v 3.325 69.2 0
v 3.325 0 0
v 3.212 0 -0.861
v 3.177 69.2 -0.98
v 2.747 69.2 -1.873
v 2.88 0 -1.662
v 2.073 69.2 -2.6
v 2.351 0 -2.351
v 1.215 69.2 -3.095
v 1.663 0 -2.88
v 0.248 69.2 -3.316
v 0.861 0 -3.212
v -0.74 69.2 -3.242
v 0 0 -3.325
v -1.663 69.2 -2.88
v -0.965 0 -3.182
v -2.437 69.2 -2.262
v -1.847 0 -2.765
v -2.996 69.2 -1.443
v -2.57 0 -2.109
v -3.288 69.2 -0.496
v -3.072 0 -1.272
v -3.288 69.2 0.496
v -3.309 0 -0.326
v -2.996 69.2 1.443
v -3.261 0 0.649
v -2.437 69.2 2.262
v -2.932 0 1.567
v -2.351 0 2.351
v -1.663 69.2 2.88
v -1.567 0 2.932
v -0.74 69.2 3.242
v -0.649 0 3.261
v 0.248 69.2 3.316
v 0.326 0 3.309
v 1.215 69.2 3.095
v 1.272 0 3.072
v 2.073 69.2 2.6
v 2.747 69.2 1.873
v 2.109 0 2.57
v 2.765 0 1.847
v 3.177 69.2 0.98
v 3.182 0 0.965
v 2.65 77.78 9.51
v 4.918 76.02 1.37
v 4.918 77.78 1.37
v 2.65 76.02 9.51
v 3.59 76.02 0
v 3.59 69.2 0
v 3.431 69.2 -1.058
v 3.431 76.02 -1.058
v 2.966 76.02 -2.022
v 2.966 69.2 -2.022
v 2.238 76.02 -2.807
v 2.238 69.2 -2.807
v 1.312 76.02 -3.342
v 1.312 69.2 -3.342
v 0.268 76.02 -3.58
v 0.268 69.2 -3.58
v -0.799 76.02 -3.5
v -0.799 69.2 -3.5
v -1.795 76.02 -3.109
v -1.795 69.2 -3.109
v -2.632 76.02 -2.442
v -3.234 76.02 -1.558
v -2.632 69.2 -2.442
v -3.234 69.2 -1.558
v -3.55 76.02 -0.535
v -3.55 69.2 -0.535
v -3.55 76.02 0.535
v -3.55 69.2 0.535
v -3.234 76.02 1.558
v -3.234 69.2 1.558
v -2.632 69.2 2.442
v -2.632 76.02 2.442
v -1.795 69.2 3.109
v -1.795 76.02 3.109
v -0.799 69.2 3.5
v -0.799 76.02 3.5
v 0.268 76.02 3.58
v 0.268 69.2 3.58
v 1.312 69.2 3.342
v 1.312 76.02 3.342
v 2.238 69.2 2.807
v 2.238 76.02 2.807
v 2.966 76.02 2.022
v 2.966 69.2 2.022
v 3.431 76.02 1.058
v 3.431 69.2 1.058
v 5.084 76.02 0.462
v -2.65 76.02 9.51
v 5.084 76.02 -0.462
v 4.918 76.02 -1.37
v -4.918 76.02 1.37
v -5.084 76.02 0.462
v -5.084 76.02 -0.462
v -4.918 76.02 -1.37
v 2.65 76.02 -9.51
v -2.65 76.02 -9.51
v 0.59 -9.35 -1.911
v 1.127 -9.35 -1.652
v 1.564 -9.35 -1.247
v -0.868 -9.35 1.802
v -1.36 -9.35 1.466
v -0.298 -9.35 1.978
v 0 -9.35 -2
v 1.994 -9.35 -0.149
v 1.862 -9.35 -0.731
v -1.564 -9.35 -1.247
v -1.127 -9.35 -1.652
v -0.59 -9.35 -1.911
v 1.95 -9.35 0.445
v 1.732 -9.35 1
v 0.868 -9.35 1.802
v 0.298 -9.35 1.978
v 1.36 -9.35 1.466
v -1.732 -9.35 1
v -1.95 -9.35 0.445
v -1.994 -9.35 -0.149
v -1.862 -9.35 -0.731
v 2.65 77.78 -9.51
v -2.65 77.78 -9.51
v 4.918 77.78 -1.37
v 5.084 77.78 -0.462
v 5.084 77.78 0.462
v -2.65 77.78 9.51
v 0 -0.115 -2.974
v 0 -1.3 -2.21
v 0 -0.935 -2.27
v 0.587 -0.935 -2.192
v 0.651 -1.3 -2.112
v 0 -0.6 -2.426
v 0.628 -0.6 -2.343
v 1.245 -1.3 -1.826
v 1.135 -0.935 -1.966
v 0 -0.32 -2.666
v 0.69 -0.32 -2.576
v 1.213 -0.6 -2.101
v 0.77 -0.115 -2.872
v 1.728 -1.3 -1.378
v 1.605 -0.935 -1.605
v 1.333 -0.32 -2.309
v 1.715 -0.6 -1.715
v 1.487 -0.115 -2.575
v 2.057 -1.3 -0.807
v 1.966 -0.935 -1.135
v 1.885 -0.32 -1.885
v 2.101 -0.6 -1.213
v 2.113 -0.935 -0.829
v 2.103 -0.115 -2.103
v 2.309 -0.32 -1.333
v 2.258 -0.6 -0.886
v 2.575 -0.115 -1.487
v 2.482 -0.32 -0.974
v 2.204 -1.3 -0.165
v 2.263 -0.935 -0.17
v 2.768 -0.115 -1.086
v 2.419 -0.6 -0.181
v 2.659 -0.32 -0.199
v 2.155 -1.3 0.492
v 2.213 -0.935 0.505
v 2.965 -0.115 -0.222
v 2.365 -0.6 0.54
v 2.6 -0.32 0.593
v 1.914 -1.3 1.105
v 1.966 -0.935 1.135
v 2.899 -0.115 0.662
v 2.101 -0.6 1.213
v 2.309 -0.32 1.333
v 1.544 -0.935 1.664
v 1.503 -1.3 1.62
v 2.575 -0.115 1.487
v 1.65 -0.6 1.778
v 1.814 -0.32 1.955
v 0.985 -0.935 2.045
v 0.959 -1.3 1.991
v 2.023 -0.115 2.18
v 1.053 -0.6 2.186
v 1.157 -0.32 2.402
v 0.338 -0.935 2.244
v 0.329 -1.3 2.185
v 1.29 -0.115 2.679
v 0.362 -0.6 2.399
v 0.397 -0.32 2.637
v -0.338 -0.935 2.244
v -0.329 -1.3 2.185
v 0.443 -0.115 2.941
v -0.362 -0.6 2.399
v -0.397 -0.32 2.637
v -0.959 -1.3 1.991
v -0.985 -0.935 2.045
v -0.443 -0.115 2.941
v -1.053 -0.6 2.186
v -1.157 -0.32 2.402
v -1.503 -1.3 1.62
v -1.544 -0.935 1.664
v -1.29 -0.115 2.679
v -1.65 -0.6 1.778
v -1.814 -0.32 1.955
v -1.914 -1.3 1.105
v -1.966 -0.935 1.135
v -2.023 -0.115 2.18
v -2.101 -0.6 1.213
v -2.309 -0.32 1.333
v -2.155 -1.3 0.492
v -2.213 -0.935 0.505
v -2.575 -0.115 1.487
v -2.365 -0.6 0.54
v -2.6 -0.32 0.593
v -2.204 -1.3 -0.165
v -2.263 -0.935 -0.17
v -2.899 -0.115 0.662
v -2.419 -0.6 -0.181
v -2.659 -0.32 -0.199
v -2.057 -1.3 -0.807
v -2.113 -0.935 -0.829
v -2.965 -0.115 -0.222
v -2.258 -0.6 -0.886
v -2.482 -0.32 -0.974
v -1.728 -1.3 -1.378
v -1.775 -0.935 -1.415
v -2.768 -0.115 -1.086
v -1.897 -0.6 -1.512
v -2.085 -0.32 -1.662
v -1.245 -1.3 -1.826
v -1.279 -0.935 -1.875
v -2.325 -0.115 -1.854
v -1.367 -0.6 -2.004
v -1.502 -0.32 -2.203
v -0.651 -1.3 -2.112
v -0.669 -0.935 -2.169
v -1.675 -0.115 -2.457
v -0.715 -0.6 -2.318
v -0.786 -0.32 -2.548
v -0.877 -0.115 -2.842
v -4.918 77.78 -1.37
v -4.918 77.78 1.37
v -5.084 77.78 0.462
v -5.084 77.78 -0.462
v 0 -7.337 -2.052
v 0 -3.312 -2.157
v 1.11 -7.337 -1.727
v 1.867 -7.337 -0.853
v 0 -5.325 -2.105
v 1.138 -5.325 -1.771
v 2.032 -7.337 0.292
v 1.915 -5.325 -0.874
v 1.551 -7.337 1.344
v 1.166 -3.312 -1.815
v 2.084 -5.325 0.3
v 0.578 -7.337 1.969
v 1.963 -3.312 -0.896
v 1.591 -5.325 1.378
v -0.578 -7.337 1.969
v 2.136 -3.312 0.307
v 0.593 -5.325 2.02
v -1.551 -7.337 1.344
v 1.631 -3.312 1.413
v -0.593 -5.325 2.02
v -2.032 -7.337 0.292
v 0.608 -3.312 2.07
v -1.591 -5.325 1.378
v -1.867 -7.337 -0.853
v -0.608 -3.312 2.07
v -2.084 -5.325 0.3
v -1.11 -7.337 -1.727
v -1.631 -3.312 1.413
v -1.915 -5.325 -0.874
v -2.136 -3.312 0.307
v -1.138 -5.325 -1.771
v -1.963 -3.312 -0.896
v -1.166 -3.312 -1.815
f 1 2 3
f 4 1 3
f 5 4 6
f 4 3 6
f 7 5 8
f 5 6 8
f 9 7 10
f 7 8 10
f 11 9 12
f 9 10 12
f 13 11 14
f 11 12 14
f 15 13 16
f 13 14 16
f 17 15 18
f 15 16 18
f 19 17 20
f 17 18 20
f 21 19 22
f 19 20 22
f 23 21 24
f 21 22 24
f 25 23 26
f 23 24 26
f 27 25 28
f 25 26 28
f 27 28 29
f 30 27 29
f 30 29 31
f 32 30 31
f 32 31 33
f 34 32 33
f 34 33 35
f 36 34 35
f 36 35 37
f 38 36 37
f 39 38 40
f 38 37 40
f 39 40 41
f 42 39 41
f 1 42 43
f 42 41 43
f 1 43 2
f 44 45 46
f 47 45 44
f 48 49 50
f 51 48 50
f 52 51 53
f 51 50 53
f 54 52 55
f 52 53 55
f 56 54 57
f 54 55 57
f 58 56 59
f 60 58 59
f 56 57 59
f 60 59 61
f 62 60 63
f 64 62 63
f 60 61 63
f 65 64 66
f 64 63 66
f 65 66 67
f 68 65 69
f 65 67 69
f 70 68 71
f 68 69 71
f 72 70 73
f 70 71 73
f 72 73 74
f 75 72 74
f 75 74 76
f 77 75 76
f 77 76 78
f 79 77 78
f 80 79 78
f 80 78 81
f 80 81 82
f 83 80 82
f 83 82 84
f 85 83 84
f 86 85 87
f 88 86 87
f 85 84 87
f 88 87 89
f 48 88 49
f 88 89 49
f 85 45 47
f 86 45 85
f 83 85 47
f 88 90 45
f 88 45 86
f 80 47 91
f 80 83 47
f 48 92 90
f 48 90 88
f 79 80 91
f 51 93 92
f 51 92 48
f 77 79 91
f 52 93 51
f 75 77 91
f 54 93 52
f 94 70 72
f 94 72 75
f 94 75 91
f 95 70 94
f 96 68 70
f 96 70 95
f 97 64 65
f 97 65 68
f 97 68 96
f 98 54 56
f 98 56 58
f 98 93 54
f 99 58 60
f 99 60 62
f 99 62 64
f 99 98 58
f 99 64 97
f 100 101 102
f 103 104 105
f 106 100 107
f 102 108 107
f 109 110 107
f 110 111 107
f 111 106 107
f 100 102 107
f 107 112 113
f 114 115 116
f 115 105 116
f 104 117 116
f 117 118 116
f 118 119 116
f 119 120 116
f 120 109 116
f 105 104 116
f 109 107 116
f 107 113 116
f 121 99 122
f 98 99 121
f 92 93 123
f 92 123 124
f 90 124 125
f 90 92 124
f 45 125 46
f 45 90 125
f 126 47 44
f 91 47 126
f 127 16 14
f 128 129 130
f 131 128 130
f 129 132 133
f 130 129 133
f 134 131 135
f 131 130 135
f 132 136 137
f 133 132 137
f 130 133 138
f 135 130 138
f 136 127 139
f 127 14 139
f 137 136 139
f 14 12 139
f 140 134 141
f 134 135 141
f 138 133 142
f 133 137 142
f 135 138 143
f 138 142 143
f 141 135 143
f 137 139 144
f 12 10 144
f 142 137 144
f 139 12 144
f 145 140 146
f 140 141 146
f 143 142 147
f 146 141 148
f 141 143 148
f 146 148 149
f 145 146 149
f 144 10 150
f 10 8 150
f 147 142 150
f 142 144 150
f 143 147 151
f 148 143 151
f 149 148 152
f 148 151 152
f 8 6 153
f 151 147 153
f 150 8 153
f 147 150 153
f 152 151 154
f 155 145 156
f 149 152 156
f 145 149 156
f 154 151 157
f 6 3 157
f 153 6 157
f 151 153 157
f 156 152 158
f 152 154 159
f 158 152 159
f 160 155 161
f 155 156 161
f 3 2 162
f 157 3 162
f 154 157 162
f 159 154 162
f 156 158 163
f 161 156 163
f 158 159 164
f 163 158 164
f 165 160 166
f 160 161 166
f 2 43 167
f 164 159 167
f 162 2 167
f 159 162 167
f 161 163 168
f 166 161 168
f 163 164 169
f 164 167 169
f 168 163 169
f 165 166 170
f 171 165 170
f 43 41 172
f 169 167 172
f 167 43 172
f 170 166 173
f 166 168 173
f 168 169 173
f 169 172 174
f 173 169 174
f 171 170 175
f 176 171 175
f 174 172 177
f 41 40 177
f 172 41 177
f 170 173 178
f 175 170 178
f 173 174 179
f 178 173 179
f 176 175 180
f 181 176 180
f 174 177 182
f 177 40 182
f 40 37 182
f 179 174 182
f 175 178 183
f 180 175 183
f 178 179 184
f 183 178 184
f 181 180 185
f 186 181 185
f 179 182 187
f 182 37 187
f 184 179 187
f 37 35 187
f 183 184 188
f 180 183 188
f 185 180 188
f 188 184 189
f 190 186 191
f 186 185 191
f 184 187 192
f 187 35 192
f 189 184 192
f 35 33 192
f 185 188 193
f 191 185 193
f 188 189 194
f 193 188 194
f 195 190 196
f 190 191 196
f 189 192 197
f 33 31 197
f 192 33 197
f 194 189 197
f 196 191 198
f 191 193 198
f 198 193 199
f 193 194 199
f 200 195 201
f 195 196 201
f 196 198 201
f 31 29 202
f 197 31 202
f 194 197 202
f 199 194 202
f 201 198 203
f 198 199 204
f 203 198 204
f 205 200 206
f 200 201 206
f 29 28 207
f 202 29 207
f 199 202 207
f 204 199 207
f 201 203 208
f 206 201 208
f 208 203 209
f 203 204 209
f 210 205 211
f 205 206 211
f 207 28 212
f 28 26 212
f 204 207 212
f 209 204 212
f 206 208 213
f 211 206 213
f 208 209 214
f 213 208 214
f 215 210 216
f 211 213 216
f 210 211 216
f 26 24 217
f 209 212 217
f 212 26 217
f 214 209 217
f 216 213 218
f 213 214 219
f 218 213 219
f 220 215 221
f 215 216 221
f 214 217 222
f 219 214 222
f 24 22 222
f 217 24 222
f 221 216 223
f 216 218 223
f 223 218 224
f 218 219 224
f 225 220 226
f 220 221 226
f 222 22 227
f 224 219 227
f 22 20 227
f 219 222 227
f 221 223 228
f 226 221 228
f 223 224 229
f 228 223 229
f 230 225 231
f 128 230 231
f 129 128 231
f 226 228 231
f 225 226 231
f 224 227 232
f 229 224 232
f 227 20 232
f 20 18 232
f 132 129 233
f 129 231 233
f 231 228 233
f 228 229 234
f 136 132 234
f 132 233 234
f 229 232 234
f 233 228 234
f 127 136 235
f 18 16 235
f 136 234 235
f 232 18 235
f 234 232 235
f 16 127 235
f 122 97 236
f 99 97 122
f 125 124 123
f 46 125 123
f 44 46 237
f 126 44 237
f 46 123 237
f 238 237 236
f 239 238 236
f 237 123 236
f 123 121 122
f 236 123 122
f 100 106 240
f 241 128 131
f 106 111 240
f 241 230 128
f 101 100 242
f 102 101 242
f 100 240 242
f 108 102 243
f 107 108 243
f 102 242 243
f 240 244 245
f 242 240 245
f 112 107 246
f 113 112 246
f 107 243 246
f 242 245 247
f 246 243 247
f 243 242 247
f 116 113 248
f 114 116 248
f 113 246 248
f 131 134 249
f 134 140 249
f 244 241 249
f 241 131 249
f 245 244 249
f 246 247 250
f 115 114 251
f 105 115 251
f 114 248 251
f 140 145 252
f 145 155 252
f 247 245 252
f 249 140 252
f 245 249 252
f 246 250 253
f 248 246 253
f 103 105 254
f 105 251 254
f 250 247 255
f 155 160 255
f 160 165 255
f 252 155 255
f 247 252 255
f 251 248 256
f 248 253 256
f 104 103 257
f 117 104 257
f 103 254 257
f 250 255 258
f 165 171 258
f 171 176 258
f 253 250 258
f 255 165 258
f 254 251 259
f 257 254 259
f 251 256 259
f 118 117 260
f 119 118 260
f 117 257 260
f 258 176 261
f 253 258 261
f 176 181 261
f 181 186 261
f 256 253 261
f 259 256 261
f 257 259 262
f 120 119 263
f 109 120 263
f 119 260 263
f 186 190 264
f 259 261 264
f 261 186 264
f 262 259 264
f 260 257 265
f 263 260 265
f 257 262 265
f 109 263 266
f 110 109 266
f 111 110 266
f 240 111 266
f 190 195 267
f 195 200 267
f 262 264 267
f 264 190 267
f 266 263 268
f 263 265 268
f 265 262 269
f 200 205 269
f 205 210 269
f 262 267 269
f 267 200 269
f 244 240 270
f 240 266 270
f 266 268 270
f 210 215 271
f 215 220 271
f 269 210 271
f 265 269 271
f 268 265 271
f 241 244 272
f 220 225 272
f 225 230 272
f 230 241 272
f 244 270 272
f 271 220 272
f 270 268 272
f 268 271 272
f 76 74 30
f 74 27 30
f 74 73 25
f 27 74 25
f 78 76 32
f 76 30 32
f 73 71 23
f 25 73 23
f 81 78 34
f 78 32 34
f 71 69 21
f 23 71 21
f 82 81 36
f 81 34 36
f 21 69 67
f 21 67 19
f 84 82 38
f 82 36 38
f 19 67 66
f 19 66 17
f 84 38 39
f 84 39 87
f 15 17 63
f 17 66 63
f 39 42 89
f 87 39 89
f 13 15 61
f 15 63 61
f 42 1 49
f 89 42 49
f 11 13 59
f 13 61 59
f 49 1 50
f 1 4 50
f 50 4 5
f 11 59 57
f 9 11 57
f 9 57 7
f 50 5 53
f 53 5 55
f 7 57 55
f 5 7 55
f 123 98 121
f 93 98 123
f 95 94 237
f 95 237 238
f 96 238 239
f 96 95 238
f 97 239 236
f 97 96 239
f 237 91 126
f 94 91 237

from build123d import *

# Parameters (mm, degrees)
SKETCH1_R           = 3.325
BOSS_EXTRUDE1_DEPTH = 69.2
SKETCH2_R           = 3.59
BOSS_EXTRUDE2_DEPTH = 6.82
BOSS_EXTRUDE3_DEPTH = 1.76


with BuildPart() as part:
    # Sketch1 → Boss-Extrude1 (new body)
    with BuildSketch(Plane(origin=(0, 0, 0), x_dir=(1, 0, 0), z_dir=(0, 1, 0))):
        Circle(SKETCH1_R)
    extrude(amount=BOSS_EXTRUDE1_DEPTH)

    # Sketch2 → Boss-Extrude2 (add)
    with BuildSketch(Plane(origin=(0, 69.2, 0), x_dir=(1, 0, 0), z_dir=(0, 1, 0))):
        Circle(SKETCH2_R)
    extrude(amount=BOSS_EXTRUDE2_DEPTH)

    # Sketch3 → Boss-Extrude3 (add)
    with BuildSketch(Plane(origin=(0, 76.02, 0), x_dir=(1, 0, 0), z_dir=(0, 1, 0))):
        with BuildLine():
            Line((-4.91772543, 1.370037078), (-2.65, 9.51))
            Line((-2.65, 9.51), (2.65, 9.51))
            Line((2.65, 9.51), (4.91772543, 1.370037078))
            ThreePointArc((4.91772543, 1.370037078), (5.105, 0), (4.91772543, -1.370037078))
            Line((4.91772543, -1.370037078), (2.65, -9.51))
            Line((2.65, -9.51), (-2.65, -9.51))
            Line((-2.65, -9.51), (-4.91772543, -1.370037078))
            ThreePointArc((-4.91772543, -1.370037078), (-5.105, 0), (-4.91772543, 1.370037078))
        make_face()
    extrude(amount=BOSS_EXTRUDE3_DEPTH)

    # Sketch4 → Revolve1 (revolve)
    with BuildSketch(Plane(origin=(0, 0, 0), x_dir=(0, 0, -1), z_dir=(1, 0, 0))):
        with BuildLine():
            Line((0, 0), (0, -9.35))
            Line((0, -9.35), (2, -9.35))
            Line((2, -9.35), (2.21, -1.3))
            ThreePointArc((2.21, -1.3), (2.536524, -0.451893662), (3.325, 0))
            Line((3.325, 0), (0, 0))
        make_face()
    revolve(axis=Axis((0, 0, 0), (0, -1, 0)))


solid = part.part
